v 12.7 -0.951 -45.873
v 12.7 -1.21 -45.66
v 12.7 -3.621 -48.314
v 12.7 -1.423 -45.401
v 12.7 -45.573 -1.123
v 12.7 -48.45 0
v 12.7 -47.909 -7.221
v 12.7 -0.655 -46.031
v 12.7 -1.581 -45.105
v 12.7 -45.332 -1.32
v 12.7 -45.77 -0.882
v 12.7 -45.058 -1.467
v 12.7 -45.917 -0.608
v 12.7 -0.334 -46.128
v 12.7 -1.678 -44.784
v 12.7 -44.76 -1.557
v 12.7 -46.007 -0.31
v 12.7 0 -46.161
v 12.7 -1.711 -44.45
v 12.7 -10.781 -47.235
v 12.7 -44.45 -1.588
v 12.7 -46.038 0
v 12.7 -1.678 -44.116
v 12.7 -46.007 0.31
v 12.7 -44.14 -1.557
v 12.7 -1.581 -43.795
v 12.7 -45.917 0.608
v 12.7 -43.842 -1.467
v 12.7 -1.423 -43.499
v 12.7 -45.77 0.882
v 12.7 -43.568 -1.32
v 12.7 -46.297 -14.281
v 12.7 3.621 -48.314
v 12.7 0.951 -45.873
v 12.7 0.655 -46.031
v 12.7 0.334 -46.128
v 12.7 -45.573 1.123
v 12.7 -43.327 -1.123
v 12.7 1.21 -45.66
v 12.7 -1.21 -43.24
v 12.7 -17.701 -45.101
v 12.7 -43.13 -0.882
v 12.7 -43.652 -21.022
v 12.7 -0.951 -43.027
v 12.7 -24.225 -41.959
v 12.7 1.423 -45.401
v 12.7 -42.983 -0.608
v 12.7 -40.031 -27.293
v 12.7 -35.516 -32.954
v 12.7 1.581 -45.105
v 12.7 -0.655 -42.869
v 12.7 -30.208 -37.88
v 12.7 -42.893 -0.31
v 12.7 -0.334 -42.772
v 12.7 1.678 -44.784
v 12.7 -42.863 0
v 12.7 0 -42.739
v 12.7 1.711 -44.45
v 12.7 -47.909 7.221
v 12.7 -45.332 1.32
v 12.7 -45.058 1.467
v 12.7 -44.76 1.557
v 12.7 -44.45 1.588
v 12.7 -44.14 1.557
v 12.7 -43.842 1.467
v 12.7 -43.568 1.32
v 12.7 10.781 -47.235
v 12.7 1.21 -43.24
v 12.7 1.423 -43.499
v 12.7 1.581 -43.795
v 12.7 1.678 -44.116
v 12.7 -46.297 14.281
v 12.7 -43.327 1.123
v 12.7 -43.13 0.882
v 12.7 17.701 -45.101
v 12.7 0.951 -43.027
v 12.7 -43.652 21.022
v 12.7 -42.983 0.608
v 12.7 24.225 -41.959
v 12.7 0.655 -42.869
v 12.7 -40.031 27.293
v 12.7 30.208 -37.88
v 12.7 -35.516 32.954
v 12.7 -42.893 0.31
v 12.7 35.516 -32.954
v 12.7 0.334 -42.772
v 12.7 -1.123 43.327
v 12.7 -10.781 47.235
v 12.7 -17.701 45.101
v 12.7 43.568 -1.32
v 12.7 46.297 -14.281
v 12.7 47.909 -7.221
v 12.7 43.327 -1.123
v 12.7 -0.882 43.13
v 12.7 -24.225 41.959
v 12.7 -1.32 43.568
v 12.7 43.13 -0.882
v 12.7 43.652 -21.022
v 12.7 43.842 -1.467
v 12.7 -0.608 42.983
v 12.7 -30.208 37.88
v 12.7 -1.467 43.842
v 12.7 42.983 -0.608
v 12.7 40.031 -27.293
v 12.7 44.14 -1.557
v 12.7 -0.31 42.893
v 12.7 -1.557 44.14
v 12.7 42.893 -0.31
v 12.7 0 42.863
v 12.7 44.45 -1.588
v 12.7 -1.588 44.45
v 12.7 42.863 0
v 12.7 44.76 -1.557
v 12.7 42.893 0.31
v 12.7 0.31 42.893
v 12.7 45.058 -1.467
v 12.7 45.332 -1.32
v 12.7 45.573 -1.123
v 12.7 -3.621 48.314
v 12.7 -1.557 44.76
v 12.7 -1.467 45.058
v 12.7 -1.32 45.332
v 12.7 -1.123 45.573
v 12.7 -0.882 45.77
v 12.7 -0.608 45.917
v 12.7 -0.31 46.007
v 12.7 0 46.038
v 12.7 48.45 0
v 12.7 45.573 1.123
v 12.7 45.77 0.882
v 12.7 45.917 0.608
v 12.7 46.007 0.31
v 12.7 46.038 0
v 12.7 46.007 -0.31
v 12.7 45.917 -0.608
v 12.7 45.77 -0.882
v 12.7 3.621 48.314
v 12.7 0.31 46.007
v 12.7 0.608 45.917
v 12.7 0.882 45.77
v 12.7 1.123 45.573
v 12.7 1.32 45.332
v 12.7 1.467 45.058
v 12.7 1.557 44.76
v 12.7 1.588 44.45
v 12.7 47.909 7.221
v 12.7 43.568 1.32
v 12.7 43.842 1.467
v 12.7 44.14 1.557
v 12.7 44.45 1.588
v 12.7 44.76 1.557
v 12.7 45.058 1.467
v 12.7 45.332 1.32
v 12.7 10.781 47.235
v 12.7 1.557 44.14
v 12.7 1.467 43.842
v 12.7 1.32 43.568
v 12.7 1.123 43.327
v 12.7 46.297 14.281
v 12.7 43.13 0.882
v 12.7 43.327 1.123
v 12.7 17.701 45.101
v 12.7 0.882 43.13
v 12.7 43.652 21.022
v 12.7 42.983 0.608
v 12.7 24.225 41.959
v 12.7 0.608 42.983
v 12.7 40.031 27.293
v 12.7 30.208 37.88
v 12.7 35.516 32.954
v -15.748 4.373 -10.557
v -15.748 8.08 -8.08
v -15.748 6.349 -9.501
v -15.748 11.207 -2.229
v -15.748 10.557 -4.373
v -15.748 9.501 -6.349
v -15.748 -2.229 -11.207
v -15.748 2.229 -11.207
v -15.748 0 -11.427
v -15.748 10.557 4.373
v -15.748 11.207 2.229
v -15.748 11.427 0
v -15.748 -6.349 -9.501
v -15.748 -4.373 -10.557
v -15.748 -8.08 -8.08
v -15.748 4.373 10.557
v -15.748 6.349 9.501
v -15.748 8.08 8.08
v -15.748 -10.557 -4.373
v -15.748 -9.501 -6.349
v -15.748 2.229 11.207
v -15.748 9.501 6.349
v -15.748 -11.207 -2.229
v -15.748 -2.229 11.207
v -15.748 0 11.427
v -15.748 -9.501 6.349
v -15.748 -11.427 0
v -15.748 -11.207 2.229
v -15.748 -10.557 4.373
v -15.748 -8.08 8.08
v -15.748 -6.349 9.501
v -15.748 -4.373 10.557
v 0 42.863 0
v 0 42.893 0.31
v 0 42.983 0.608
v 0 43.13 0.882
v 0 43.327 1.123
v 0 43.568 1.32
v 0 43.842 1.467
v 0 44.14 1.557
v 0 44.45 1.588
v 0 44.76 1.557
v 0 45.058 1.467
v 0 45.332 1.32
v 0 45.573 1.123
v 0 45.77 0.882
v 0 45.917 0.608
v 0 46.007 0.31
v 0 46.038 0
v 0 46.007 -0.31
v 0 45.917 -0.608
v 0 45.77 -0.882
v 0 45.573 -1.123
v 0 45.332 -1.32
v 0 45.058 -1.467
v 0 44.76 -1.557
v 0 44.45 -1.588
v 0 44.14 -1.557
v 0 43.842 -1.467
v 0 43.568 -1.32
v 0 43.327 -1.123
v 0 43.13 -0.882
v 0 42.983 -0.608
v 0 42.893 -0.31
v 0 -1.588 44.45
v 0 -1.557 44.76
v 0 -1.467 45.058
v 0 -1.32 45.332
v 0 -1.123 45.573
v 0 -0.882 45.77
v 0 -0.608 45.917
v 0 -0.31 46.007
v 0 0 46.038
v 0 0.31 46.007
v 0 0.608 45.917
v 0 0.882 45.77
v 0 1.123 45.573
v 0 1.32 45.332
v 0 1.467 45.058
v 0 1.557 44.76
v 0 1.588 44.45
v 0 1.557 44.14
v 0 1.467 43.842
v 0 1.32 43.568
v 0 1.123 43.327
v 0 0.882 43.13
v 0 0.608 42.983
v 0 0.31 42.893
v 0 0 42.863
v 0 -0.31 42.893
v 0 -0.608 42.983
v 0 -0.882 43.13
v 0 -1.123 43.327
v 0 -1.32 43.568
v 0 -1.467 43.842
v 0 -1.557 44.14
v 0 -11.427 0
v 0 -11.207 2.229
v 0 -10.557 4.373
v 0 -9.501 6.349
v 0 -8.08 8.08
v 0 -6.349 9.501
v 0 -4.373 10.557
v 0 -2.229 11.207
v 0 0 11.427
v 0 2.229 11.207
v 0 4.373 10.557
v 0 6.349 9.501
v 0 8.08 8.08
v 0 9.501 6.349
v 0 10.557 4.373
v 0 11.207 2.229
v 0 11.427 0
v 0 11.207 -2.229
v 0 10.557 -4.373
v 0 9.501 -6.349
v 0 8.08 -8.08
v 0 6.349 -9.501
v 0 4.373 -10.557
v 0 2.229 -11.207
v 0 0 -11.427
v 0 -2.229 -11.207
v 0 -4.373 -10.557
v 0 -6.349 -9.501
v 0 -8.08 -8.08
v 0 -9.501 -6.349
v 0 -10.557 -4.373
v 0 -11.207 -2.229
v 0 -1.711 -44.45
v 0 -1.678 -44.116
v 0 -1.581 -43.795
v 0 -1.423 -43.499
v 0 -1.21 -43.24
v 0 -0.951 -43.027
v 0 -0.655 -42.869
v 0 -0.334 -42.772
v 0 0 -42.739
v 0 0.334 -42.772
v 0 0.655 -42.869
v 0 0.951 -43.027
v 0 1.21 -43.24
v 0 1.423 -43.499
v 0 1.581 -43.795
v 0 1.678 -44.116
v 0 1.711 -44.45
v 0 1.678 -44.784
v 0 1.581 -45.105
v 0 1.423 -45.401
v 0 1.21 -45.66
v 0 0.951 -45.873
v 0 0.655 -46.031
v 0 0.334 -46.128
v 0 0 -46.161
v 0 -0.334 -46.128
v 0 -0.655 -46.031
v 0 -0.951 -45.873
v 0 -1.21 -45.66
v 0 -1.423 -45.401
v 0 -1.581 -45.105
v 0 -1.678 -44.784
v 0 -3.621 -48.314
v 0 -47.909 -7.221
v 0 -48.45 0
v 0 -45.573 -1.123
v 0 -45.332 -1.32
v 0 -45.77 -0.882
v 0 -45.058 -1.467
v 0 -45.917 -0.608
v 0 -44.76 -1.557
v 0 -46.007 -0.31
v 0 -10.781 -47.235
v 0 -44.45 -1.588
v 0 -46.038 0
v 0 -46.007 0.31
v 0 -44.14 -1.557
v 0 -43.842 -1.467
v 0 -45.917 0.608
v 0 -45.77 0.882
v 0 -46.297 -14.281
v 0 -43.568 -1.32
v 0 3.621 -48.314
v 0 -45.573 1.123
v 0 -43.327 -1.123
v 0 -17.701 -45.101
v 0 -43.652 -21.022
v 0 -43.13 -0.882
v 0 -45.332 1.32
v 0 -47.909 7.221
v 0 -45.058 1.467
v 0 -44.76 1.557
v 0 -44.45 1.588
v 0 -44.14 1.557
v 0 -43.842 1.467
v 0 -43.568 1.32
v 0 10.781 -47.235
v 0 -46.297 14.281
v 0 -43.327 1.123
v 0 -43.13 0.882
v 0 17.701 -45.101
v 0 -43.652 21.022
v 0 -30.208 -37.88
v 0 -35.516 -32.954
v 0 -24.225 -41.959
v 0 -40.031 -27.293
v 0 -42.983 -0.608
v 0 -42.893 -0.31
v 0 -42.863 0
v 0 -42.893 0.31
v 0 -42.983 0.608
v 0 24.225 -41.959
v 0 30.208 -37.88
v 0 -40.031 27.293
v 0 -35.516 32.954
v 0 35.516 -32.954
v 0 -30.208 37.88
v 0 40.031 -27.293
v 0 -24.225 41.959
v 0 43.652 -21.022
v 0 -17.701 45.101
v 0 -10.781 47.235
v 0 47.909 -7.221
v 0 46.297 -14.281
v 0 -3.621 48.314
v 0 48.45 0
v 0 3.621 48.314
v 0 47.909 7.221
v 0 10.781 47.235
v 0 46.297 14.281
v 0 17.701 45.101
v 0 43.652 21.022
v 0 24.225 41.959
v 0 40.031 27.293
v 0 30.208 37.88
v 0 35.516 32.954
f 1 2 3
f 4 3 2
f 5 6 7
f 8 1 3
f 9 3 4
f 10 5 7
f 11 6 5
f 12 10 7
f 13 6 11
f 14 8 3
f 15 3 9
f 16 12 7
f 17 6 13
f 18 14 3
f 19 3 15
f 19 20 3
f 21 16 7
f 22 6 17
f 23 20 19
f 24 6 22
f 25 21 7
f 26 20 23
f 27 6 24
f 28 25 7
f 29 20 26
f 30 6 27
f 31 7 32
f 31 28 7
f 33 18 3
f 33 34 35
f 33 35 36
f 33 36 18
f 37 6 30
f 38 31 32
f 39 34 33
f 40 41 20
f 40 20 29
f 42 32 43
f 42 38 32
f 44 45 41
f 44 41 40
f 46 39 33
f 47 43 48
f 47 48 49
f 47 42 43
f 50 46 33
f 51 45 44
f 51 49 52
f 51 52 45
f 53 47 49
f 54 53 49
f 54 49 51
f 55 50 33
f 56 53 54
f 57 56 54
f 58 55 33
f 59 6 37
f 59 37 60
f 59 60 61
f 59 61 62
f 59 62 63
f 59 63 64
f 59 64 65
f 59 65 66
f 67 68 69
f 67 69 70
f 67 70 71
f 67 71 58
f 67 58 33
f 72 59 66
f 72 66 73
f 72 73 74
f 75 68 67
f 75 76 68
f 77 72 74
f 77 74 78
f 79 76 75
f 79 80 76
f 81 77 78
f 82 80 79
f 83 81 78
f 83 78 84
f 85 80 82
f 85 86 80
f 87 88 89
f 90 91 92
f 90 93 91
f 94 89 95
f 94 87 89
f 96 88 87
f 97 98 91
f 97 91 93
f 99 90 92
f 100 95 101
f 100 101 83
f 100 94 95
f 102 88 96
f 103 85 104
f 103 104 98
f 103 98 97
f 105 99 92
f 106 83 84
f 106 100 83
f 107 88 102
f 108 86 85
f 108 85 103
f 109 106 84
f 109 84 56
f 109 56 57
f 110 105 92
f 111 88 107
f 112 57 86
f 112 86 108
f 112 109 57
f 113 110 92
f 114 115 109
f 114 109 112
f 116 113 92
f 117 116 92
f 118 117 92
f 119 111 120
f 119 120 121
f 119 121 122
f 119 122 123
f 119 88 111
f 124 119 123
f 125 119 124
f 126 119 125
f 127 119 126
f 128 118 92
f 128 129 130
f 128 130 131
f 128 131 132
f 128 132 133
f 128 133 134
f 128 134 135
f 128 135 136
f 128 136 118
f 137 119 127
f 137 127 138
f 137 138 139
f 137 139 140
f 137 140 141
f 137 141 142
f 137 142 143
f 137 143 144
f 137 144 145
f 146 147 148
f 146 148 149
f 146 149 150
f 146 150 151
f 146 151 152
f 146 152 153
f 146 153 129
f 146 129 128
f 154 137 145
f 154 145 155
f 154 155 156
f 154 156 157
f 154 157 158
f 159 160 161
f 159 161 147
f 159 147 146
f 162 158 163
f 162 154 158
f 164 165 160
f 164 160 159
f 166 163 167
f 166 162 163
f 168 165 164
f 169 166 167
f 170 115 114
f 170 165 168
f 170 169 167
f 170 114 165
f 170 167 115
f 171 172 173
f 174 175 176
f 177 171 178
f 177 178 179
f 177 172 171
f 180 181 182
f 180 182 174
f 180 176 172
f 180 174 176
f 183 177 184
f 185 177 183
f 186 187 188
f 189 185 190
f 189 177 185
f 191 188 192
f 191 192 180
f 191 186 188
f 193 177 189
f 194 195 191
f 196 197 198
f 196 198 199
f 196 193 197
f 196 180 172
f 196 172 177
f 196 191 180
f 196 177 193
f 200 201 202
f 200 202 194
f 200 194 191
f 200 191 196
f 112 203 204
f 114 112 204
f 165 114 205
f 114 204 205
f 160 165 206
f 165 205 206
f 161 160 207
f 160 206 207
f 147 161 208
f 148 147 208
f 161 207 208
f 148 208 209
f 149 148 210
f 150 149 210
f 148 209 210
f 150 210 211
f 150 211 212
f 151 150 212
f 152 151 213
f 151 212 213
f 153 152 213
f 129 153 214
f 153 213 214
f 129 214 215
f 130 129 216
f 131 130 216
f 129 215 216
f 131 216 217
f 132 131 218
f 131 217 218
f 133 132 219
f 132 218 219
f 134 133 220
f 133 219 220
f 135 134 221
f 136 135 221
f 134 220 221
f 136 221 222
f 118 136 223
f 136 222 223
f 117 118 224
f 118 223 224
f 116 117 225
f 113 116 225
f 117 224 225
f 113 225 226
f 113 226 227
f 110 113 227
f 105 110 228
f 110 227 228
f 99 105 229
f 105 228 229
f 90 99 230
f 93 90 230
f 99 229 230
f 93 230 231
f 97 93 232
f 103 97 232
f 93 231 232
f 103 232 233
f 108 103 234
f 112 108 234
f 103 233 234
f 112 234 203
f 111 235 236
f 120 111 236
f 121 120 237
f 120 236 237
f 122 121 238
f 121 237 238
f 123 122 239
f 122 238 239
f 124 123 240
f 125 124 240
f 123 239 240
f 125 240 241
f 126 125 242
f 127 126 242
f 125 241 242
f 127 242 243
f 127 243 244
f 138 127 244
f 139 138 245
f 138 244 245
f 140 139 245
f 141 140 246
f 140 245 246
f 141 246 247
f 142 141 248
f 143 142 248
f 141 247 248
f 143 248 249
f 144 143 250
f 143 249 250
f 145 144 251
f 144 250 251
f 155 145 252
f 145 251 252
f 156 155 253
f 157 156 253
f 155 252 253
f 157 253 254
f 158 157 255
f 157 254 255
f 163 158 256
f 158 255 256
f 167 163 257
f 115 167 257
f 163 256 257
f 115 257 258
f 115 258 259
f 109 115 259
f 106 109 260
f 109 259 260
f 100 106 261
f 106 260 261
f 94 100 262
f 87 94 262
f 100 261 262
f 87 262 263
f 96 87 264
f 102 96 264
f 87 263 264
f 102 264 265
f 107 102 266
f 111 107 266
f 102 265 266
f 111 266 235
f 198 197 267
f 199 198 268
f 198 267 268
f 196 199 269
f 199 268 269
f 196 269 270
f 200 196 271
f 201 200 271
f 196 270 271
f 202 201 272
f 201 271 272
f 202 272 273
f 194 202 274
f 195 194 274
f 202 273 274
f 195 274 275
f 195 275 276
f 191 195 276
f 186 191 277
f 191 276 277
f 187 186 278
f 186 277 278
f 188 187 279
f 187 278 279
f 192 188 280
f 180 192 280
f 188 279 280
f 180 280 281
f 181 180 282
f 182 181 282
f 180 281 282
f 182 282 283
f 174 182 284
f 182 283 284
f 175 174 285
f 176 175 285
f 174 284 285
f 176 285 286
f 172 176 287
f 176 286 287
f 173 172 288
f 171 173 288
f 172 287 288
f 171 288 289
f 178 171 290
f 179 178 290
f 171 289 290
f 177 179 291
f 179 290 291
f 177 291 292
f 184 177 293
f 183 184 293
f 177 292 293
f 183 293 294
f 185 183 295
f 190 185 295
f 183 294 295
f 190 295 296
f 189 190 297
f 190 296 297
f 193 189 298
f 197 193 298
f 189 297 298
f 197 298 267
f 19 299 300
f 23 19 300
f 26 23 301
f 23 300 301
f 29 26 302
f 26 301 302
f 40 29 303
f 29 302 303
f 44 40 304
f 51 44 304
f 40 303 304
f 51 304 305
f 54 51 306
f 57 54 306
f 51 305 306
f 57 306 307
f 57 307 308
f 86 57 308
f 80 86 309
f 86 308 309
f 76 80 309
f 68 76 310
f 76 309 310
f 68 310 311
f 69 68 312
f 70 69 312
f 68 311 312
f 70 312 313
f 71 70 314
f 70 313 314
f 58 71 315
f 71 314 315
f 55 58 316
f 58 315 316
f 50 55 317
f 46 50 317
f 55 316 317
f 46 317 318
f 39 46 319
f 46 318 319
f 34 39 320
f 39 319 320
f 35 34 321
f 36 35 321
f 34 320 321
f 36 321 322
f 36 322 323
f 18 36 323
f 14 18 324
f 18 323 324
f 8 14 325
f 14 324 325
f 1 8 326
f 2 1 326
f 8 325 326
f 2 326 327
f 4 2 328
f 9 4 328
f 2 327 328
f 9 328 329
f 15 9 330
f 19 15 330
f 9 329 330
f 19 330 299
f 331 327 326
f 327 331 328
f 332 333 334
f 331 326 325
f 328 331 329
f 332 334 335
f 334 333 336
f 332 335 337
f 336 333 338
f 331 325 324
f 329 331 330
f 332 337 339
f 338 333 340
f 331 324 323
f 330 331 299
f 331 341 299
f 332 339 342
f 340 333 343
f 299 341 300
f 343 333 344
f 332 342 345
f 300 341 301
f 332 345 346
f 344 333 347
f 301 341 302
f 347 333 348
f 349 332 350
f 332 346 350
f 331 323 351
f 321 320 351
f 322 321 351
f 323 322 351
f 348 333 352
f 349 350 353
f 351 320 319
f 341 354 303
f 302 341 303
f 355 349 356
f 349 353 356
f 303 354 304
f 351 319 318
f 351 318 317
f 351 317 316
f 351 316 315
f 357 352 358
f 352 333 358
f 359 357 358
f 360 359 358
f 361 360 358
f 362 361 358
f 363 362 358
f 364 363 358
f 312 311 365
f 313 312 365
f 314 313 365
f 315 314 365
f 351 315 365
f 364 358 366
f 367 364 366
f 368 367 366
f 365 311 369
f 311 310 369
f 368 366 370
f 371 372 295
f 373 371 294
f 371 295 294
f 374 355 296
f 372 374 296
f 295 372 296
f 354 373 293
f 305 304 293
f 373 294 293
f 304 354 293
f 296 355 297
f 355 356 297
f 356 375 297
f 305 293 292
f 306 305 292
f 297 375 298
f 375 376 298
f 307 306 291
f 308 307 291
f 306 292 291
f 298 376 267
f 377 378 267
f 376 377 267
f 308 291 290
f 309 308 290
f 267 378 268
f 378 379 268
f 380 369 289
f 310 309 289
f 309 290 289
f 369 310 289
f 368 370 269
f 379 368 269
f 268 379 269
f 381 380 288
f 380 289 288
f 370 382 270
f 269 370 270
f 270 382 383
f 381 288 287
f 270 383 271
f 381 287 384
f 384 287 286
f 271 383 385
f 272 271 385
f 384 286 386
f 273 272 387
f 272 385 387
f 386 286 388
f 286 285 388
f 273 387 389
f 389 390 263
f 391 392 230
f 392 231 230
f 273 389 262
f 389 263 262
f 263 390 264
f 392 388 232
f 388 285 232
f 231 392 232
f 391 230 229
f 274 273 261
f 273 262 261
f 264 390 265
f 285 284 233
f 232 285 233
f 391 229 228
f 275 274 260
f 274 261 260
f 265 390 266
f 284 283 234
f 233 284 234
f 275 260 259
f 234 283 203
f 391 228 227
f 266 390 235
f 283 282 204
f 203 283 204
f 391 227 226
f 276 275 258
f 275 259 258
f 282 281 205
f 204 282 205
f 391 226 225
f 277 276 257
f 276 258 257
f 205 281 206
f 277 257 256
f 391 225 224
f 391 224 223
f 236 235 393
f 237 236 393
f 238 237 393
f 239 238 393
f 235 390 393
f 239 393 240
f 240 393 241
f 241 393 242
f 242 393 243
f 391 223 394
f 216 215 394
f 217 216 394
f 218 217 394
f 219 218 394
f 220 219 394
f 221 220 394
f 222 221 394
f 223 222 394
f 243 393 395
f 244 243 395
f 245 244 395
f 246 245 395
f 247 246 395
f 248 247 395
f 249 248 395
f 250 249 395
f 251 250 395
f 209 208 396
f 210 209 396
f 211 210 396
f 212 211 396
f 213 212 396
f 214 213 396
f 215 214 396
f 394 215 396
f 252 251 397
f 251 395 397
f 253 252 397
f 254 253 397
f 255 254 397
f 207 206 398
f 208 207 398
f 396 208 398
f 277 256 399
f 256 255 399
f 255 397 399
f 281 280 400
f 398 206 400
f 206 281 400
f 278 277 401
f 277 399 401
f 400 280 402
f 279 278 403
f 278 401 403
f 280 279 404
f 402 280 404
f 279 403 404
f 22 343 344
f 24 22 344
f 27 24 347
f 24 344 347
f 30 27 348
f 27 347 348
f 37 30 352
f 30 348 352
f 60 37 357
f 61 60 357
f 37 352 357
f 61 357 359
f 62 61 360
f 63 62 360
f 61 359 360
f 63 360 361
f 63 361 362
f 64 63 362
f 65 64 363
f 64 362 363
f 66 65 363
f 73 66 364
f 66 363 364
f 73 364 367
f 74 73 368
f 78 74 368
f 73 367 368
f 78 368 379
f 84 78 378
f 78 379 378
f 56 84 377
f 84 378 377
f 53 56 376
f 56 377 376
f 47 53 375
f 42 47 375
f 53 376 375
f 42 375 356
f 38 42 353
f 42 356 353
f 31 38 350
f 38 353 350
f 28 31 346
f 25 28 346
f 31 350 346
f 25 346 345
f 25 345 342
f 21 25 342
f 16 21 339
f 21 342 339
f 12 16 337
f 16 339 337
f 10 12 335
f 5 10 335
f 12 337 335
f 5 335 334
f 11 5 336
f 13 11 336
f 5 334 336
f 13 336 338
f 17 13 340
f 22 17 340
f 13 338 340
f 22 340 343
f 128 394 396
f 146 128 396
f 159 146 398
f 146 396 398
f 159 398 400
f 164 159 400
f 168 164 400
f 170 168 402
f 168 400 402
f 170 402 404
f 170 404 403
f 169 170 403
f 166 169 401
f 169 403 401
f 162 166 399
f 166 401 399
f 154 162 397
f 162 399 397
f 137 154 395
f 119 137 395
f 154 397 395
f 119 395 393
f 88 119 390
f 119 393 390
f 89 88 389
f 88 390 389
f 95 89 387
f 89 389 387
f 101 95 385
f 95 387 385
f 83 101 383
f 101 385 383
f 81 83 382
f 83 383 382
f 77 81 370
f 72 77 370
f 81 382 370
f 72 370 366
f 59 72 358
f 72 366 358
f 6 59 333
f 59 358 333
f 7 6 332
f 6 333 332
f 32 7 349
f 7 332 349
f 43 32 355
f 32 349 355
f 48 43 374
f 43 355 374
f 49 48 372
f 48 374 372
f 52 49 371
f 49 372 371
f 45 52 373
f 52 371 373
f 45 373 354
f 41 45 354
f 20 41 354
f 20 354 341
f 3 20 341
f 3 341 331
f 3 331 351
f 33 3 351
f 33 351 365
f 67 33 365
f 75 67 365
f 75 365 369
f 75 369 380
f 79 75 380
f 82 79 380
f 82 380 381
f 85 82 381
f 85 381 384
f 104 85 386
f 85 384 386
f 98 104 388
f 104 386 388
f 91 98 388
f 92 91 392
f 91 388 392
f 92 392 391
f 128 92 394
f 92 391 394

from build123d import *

# Parameters (mm, degrees)
F0_R     = 48.449945
F1_DEPTH = 12.7
F2_R     = 11.427041
F3_DEPTH = 15.748
F4_R     = 1.5875
F4_R_2   = 1.71099
F5_DEPTH = 12.7


with BuildPart() as f1:
    # F0 (on Right) → F1 (new body)
    with BuildSketch(Plane.YZ):
        Circle(F0_R)
    extrude(amount=F1_DEPTH)

    # F2 (on face) → F3 (join)
    with BuildSketch(Plane(origin=(0, 0, 0), x_dir=(0, -1, 0), z_dir=(-1, 0, 0))):
        Circle(F2_R)
    extrude(amount=F3_DEPTH)

    # F4 (on face) → F5 (cut)
    with BuildSketch(Plane(origin=(0, 0, 0), x_dir=(0, -1, 0), z_dir=(-1, 0, 0))):
        with Locations((0, 44.45)):
            Circle(F4_R)
        with Locations((0, -44.45)):
            Circle(F4_R_2)
        with Locations((44.45, 0)):
            Circle(F4_R)
        with Locations((-44.45, 0)):
            Circle(F4_R)
    extrude(amount=-F5_DEPTH, mode=Mode.SUBTRACT)


solid = f1.part
